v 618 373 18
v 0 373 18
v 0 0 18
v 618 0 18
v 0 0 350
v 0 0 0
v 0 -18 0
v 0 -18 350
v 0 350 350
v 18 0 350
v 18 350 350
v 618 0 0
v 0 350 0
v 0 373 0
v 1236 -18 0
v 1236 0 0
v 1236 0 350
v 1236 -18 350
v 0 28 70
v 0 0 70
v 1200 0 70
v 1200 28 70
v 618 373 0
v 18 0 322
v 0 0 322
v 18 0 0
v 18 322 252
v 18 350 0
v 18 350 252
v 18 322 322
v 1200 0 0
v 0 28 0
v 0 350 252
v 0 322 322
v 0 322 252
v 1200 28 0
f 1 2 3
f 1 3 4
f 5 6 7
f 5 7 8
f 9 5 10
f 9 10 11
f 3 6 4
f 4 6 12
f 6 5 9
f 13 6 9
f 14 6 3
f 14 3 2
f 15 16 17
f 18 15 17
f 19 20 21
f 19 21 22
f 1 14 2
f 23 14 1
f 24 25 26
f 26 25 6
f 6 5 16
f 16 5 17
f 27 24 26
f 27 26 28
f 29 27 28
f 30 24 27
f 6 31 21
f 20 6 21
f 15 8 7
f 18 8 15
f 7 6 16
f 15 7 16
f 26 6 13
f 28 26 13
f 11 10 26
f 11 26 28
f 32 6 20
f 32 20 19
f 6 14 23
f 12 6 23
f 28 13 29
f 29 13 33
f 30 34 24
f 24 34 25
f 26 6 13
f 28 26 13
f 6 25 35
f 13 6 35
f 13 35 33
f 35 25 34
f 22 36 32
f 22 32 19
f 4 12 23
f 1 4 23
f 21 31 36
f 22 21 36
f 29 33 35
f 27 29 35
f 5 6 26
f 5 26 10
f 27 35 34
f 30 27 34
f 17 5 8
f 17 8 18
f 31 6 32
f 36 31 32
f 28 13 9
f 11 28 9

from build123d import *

# Parameters (mm, degrees)
F1_W      = 350
F1_H      = 350
F2_DEPTH  = 18
F3_W      = 28
F3_H      = 70
F4_DEPTH  = 1200
F6_DEPTH  = 18
F7_W      = 1236
F7_H      = 350
F8_DEPTH  = 18
F9_W      = 618
F9_H      = 373
F10_DEPTH = 18


with BuildPart() as f2:
    # F1 (on Right) → F2 (new body)
    with BuildSketch(Plane.YZ):
        with Locations((175, 175)):
            Rectangle(F1_W, F1_H)
    extrude(amount=F2_DEPTH)


with BuildPart() as f4:
    # F3 (on Right) → F4 (new body)
    with BuildSketch(Plane.YZ):
        with Locations((14, 35)):
            Rectangle(F3_W, F3_H)
    extrude(amount=F4_DEPTH)


with BuildPart() as f6:
    # F5 (on Right) → F6 (new body)
    with BuildSketch(Plane.YZ):
        Polygon((0, 322), (0, 0), (350, 0), (350, 252), (322, 252), (322, 322), align=None)
    extrude(amount=F6_DEPTH)


with BuildPart() as f8:
    # F7 (on Front) → F8 (new body)
    with BuildSketch(Plane.XZ):
        with Locations((618, 175)):
            Rectangle(F7_W, F7_H)
    extrude(amount=F8_DEPTH)


with BuildPart() as f10:
    # F9 (on Top) → F10 (new body)
    with BuildSketch(Plane.XY):
        with Locations((309, 186.5)):
            Rectangle(F9_W, F9_H)
    extrude(amount=F10_DEPTH)


solid = Compound([f2.part, f4.part, f6.part, f8.part, f10.part])
